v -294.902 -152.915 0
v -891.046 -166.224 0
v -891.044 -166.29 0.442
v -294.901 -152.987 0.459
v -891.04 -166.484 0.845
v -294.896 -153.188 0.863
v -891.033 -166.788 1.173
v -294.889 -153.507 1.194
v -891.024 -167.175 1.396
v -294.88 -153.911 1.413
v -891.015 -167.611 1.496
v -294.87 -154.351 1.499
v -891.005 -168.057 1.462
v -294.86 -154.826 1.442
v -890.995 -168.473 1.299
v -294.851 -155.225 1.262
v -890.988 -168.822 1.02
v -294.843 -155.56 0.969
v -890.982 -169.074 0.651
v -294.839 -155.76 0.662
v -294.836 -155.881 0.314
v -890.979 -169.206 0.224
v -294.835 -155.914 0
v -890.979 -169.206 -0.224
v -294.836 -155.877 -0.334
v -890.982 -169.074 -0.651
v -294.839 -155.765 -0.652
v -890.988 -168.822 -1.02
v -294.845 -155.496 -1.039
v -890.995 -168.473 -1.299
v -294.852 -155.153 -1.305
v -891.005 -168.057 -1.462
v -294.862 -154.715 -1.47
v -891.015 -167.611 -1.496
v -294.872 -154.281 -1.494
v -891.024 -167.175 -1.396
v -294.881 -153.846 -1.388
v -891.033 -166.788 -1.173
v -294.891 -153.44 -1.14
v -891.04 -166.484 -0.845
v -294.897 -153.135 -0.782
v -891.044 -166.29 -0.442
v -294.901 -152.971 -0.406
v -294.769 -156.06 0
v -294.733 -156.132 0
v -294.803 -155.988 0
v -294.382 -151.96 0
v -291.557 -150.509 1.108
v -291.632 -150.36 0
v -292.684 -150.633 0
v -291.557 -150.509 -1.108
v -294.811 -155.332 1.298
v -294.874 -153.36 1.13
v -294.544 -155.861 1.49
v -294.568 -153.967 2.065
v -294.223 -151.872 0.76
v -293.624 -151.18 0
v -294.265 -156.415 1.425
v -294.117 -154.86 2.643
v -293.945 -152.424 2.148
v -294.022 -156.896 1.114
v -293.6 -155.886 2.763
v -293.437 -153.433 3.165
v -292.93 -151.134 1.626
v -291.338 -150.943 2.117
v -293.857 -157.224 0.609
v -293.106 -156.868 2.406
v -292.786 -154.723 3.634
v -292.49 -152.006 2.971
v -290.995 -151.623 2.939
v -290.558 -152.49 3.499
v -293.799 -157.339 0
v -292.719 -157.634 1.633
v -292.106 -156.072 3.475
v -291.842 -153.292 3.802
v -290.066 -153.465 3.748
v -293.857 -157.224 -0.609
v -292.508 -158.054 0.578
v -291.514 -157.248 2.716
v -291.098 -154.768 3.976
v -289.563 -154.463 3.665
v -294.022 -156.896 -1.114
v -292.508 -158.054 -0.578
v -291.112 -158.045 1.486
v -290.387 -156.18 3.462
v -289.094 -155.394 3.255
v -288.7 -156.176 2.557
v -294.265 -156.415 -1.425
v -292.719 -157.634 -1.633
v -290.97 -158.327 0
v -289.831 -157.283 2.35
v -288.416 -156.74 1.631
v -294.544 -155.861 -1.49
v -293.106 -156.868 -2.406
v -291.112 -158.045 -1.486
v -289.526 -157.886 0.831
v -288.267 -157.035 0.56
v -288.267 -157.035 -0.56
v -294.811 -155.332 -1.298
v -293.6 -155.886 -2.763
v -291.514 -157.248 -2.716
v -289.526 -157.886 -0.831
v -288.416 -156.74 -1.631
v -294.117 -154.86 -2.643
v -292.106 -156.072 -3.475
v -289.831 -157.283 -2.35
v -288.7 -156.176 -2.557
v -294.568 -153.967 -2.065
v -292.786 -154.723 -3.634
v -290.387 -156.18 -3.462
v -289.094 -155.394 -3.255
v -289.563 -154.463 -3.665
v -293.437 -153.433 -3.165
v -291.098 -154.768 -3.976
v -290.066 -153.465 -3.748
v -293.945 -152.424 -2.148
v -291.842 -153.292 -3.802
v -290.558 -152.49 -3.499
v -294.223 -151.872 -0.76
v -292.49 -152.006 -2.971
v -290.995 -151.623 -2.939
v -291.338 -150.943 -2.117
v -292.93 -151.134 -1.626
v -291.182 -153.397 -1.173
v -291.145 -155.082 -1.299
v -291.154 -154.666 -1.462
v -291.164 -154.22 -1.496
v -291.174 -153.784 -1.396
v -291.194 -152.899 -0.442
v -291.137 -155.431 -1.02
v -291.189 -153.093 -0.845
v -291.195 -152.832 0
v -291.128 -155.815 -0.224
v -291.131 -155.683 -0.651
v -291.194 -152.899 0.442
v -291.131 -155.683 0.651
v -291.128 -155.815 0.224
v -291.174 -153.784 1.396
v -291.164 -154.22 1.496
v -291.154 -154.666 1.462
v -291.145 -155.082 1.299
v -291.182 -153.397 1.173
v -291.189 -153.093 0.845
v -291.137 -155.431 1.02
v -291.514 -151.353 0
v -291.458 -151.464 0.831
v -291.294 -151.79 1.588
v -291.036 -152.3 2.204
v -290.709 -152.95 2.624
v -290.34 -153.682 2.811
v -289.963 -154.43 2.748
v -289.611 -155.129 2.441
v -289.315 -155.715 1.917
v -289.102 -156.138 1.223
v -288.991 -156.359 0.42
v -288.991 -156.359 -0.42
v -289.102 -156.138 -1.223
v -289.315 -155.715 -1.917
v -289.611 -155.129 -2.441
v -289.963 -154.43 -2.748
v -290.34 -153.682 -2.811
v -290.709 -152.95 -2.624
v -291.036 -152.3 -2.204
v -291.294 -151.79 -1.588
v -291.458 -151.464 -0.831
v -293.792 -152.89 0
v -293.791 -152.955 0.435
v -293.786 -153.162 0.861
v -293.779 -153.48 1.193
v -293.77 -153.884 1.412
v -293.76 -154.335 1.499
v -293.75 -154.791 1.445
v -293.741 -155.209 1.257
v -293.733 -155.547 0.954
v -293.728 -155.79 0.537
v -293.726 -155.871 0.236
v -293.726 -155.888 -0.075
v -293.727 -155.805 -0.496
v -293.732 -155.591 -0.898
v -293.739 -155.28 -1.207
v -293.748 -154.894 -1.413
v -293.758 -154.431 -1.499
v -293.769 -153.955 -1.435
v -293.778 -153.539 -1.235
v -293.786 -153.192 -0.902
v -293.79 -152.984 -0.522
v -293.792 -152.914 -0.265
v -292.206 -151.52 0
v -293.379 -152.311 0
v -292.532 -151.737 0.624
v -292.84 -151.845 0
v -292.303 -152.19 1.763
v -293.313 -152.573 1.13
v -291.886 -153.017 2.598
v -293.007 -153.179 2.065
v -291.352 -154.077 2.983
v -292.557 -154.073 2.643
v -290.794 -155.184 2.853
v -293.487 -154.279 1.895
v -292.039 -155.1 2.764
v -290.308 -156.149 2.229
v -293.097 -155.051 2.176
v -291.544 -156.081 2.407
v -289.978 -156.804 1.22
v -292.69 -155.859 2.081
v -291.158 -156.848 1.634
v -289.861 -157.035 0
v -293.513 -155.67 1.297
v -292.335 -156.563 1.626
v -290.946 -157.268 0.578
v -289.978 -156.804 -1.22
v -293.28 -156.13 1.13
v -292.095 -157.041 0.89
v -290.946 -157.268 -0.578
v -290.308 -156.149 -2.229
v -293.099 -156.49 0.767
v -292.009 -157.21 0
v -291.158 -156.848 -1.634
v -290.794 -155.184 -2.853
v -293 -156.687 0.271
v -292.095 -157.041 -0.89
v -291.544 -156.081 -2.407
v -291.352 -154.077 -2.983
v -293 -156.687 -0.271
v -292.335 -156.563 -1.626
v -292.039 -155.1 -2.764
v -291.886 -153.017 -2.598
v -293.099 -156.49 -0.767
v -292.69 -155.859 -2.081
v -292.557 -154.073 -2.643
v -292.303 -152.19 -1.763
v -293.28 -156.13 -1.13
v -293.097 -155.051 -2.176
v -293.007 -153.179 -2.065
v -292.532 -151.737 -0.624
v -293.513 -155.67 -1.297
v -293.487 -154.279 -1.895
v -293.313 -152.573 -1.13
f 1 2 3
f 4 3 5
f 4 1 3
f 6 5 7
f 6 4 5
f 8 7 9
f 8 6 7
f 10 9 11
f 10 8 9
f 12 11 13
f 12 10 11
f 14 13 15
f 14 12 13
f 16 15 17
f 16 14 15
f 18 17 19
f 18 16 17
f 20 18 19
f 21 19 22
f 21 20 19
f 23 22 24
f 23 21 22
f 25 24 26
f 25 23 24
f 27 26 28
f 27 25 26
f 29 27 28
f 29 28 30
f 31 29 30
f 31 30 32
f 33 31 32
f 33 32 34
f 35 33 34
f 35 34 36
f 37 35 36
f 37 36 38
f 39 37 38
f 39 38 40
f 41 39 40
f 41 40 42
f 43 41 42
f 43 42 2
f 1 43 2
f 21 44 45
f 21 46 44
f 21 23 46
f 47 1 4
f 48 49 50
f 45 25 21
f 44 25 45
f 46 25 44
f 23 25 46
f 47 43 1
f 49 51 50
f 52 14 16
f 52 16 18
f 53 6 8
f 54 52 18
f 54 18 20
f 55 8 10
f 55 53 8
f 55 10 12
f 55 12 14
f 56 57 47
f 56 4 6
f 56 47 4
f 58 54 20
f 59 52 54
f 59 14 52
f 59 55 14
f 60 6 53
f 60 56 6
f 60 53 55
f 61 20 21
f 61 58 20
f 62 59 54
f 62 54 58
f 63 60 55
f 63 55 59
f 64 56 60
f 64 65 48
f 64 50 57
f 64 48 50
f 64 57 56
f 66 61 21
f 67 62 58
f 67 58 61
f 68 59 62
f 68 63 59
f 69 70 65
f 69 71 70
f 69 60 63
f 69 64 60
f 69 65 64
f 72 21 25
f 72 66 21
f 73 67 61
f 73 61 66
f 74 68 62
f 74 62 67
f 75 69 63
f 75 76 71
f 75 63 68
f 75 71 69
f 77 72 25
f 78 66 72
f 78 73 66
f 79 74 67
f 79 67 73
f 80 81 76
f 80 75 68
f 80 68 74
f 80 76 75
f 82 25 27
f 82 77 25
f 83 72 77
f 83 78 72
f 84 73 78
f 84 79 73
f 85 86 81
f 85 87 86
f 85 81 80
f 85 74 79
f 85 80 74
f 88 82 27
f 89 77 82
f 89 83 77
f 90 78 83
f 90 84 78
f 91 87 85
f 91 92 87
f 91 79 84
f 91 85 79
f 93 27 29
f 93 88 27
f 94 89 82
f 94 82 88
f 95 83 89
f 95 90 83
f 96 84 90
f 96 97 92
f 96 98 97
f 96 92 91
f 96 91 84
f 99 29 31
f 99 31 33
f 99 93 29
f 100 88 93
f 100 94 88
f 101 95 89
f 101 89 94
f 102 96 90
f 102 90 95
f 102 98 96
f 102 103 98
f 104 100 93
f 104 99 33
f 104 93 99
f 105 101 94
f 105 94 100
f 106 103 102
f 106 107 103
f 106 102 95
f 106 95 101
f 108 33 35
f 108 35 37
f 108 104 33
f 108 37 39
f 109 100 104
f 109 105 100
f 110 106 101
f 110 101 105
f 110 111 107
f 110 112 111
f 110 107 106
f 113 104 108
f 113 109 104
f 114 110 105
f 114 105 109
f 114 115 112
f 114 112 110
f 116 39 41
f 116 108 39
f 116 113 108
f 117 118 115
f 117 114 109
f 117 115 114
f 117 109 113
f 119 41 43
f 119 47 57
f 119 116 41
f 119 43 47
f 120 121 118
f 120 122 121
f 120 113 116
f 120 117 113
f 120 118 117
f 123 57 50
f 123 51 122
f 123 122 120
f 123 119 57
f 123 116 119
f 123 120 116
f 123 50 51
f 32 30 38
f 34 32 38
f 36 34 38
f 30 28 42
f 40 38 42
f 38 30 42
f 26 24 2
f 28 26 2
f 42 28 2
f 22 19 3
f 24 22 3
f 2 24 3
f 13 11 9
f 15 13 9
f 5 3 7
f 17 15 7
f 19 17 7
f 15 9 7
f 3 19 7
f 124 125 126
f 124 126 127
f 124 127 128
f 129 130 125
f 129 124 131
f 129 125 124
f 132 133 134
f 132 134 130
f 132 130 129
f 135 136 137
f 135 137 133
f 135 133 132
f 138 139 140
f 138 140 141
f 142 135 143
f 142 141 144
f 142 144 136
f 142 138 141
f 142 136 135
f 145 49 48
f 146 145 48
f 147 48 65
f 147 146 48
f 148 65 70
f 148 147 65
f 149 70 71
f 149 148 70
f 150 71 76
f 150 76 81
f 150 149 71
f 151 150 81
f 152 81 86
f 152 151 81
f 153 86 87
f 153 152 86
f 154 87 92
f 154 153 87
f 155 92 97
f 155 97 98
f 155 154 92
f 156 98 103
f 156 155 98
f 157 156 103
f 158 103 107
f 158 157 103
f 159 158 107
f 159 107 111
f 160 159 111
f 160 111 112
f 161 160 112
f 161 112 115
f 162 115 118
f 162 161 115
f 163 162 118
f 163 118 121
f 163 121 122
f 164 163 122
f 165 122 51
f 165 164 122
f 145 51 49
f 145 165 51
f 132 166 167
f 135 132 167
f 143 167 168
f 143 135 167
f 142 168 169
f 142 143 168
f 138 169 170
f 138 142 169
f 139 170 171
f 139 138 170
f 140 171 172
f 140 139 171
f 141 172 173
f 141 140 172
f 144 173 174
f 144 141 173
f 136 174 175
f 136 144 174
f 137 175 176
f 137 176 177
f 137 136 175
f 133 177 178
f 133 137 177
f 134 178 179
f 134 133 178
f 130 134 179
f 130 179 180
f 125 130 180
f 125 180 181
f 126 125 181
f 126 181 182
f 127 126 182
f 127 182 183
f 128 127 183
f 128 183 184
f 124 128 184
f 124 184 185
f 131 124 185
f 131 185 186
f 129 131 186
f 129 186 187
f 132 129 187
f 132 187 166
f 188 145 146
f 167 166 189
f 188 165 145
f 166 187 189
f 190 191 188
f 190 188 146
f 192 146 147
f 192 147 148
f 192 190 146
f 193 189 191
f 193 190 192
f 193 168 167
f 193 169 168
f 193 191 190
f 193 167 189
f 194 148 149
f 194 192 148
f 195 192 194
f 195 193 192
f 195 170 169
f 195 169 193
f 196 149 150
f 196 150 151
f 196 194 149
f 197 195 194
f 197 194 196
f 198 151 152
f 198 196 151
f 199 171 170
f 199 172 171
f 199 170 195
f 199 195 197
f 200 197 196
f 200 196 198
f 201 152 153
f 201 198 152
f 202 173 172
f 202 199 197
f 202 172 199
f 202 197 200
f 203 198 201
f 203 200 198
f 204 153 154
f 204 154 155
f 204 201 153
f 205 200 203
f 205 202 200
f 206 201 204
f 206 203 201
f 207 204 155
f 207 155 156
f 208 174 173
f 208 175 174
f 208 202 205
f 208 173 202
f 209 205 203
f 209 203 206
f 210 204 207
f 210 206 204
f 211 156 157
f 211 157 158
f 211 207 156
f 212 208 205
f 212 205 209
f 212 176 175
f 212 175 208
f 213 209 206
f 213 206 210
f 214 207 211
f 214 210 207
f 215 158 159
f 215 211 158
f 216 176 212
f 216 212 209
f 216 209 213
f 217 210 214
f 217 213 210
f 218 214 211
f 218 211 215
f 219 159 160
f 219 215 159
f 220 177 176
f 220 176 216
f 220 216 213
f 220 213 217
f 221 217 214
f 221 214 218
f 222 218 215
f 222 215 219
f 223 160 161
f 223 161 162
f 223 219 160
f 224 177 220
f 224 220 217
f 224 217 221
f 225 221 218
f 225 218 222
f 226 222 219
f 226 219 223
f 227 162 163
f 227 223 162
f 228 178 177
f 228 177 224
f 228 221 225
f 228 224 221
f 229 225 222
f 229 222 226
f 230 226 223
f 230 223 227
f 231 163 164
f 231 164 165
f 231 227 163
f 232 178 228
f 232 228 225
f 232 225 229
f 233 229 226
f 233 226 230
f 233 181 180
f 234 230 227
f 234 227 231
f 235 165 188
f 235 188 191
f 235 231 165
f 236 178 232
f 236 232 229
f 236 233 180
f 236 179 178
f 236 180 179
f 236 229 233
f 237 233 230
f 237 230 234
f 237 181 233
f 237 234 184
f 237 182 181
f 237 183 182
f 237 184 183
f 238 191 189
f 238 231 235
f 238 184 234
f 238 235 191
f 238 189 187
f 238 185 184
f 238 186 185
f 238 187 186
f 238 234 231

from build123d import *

# Parameters (mm, degrees)
ESQUISSE4_R        = 1.5
BOSS_EXTRU_1_DEPTH = 600


with BuildPart() as part:
    # Esquisse4 → Boss.-Extru.1 (new body)
    with BuildSketch(Plane(origin=(-291.161591592, -154.331808471, 0), x_dir=(0, 0, -1), z_dir=(0.9997509014565378, 0.022318938972097364, 0))):
        with Locations(Location((0, 0, 0), (0, 0, 90))):
            Circle(ESQUISSE4_R)
    extrude(amount=-BOSS_EXTRU_1_DEPTH)

    # Esquisse5 → Révol.-Mince1 (revolve)
    with BuildSketch(Plane.XY):
        with BuildLine():
            ThreePointArc((-291.514241878, -151.352607609), (-293.804281963, -152.911883259), (-293.840511157, -155.682138047))
            Line((-293.840511157, -155.682138047), (-294.733484345, -156.132247906))
            ThreePointArc((-294.733484345, -156.132247906), (-294.685178753, -152.438574855), (-291.631791973, -150.359540655))
            Line((-291.631791973, -150.359540655), (-291.514241878, -151.352607609))
        make_face()
    revolve(axis=Axis((-293.840511157, -155.682138047, 0), (0.8929731882535339, 0.45010985887927285, 0)))


solid = part.part
